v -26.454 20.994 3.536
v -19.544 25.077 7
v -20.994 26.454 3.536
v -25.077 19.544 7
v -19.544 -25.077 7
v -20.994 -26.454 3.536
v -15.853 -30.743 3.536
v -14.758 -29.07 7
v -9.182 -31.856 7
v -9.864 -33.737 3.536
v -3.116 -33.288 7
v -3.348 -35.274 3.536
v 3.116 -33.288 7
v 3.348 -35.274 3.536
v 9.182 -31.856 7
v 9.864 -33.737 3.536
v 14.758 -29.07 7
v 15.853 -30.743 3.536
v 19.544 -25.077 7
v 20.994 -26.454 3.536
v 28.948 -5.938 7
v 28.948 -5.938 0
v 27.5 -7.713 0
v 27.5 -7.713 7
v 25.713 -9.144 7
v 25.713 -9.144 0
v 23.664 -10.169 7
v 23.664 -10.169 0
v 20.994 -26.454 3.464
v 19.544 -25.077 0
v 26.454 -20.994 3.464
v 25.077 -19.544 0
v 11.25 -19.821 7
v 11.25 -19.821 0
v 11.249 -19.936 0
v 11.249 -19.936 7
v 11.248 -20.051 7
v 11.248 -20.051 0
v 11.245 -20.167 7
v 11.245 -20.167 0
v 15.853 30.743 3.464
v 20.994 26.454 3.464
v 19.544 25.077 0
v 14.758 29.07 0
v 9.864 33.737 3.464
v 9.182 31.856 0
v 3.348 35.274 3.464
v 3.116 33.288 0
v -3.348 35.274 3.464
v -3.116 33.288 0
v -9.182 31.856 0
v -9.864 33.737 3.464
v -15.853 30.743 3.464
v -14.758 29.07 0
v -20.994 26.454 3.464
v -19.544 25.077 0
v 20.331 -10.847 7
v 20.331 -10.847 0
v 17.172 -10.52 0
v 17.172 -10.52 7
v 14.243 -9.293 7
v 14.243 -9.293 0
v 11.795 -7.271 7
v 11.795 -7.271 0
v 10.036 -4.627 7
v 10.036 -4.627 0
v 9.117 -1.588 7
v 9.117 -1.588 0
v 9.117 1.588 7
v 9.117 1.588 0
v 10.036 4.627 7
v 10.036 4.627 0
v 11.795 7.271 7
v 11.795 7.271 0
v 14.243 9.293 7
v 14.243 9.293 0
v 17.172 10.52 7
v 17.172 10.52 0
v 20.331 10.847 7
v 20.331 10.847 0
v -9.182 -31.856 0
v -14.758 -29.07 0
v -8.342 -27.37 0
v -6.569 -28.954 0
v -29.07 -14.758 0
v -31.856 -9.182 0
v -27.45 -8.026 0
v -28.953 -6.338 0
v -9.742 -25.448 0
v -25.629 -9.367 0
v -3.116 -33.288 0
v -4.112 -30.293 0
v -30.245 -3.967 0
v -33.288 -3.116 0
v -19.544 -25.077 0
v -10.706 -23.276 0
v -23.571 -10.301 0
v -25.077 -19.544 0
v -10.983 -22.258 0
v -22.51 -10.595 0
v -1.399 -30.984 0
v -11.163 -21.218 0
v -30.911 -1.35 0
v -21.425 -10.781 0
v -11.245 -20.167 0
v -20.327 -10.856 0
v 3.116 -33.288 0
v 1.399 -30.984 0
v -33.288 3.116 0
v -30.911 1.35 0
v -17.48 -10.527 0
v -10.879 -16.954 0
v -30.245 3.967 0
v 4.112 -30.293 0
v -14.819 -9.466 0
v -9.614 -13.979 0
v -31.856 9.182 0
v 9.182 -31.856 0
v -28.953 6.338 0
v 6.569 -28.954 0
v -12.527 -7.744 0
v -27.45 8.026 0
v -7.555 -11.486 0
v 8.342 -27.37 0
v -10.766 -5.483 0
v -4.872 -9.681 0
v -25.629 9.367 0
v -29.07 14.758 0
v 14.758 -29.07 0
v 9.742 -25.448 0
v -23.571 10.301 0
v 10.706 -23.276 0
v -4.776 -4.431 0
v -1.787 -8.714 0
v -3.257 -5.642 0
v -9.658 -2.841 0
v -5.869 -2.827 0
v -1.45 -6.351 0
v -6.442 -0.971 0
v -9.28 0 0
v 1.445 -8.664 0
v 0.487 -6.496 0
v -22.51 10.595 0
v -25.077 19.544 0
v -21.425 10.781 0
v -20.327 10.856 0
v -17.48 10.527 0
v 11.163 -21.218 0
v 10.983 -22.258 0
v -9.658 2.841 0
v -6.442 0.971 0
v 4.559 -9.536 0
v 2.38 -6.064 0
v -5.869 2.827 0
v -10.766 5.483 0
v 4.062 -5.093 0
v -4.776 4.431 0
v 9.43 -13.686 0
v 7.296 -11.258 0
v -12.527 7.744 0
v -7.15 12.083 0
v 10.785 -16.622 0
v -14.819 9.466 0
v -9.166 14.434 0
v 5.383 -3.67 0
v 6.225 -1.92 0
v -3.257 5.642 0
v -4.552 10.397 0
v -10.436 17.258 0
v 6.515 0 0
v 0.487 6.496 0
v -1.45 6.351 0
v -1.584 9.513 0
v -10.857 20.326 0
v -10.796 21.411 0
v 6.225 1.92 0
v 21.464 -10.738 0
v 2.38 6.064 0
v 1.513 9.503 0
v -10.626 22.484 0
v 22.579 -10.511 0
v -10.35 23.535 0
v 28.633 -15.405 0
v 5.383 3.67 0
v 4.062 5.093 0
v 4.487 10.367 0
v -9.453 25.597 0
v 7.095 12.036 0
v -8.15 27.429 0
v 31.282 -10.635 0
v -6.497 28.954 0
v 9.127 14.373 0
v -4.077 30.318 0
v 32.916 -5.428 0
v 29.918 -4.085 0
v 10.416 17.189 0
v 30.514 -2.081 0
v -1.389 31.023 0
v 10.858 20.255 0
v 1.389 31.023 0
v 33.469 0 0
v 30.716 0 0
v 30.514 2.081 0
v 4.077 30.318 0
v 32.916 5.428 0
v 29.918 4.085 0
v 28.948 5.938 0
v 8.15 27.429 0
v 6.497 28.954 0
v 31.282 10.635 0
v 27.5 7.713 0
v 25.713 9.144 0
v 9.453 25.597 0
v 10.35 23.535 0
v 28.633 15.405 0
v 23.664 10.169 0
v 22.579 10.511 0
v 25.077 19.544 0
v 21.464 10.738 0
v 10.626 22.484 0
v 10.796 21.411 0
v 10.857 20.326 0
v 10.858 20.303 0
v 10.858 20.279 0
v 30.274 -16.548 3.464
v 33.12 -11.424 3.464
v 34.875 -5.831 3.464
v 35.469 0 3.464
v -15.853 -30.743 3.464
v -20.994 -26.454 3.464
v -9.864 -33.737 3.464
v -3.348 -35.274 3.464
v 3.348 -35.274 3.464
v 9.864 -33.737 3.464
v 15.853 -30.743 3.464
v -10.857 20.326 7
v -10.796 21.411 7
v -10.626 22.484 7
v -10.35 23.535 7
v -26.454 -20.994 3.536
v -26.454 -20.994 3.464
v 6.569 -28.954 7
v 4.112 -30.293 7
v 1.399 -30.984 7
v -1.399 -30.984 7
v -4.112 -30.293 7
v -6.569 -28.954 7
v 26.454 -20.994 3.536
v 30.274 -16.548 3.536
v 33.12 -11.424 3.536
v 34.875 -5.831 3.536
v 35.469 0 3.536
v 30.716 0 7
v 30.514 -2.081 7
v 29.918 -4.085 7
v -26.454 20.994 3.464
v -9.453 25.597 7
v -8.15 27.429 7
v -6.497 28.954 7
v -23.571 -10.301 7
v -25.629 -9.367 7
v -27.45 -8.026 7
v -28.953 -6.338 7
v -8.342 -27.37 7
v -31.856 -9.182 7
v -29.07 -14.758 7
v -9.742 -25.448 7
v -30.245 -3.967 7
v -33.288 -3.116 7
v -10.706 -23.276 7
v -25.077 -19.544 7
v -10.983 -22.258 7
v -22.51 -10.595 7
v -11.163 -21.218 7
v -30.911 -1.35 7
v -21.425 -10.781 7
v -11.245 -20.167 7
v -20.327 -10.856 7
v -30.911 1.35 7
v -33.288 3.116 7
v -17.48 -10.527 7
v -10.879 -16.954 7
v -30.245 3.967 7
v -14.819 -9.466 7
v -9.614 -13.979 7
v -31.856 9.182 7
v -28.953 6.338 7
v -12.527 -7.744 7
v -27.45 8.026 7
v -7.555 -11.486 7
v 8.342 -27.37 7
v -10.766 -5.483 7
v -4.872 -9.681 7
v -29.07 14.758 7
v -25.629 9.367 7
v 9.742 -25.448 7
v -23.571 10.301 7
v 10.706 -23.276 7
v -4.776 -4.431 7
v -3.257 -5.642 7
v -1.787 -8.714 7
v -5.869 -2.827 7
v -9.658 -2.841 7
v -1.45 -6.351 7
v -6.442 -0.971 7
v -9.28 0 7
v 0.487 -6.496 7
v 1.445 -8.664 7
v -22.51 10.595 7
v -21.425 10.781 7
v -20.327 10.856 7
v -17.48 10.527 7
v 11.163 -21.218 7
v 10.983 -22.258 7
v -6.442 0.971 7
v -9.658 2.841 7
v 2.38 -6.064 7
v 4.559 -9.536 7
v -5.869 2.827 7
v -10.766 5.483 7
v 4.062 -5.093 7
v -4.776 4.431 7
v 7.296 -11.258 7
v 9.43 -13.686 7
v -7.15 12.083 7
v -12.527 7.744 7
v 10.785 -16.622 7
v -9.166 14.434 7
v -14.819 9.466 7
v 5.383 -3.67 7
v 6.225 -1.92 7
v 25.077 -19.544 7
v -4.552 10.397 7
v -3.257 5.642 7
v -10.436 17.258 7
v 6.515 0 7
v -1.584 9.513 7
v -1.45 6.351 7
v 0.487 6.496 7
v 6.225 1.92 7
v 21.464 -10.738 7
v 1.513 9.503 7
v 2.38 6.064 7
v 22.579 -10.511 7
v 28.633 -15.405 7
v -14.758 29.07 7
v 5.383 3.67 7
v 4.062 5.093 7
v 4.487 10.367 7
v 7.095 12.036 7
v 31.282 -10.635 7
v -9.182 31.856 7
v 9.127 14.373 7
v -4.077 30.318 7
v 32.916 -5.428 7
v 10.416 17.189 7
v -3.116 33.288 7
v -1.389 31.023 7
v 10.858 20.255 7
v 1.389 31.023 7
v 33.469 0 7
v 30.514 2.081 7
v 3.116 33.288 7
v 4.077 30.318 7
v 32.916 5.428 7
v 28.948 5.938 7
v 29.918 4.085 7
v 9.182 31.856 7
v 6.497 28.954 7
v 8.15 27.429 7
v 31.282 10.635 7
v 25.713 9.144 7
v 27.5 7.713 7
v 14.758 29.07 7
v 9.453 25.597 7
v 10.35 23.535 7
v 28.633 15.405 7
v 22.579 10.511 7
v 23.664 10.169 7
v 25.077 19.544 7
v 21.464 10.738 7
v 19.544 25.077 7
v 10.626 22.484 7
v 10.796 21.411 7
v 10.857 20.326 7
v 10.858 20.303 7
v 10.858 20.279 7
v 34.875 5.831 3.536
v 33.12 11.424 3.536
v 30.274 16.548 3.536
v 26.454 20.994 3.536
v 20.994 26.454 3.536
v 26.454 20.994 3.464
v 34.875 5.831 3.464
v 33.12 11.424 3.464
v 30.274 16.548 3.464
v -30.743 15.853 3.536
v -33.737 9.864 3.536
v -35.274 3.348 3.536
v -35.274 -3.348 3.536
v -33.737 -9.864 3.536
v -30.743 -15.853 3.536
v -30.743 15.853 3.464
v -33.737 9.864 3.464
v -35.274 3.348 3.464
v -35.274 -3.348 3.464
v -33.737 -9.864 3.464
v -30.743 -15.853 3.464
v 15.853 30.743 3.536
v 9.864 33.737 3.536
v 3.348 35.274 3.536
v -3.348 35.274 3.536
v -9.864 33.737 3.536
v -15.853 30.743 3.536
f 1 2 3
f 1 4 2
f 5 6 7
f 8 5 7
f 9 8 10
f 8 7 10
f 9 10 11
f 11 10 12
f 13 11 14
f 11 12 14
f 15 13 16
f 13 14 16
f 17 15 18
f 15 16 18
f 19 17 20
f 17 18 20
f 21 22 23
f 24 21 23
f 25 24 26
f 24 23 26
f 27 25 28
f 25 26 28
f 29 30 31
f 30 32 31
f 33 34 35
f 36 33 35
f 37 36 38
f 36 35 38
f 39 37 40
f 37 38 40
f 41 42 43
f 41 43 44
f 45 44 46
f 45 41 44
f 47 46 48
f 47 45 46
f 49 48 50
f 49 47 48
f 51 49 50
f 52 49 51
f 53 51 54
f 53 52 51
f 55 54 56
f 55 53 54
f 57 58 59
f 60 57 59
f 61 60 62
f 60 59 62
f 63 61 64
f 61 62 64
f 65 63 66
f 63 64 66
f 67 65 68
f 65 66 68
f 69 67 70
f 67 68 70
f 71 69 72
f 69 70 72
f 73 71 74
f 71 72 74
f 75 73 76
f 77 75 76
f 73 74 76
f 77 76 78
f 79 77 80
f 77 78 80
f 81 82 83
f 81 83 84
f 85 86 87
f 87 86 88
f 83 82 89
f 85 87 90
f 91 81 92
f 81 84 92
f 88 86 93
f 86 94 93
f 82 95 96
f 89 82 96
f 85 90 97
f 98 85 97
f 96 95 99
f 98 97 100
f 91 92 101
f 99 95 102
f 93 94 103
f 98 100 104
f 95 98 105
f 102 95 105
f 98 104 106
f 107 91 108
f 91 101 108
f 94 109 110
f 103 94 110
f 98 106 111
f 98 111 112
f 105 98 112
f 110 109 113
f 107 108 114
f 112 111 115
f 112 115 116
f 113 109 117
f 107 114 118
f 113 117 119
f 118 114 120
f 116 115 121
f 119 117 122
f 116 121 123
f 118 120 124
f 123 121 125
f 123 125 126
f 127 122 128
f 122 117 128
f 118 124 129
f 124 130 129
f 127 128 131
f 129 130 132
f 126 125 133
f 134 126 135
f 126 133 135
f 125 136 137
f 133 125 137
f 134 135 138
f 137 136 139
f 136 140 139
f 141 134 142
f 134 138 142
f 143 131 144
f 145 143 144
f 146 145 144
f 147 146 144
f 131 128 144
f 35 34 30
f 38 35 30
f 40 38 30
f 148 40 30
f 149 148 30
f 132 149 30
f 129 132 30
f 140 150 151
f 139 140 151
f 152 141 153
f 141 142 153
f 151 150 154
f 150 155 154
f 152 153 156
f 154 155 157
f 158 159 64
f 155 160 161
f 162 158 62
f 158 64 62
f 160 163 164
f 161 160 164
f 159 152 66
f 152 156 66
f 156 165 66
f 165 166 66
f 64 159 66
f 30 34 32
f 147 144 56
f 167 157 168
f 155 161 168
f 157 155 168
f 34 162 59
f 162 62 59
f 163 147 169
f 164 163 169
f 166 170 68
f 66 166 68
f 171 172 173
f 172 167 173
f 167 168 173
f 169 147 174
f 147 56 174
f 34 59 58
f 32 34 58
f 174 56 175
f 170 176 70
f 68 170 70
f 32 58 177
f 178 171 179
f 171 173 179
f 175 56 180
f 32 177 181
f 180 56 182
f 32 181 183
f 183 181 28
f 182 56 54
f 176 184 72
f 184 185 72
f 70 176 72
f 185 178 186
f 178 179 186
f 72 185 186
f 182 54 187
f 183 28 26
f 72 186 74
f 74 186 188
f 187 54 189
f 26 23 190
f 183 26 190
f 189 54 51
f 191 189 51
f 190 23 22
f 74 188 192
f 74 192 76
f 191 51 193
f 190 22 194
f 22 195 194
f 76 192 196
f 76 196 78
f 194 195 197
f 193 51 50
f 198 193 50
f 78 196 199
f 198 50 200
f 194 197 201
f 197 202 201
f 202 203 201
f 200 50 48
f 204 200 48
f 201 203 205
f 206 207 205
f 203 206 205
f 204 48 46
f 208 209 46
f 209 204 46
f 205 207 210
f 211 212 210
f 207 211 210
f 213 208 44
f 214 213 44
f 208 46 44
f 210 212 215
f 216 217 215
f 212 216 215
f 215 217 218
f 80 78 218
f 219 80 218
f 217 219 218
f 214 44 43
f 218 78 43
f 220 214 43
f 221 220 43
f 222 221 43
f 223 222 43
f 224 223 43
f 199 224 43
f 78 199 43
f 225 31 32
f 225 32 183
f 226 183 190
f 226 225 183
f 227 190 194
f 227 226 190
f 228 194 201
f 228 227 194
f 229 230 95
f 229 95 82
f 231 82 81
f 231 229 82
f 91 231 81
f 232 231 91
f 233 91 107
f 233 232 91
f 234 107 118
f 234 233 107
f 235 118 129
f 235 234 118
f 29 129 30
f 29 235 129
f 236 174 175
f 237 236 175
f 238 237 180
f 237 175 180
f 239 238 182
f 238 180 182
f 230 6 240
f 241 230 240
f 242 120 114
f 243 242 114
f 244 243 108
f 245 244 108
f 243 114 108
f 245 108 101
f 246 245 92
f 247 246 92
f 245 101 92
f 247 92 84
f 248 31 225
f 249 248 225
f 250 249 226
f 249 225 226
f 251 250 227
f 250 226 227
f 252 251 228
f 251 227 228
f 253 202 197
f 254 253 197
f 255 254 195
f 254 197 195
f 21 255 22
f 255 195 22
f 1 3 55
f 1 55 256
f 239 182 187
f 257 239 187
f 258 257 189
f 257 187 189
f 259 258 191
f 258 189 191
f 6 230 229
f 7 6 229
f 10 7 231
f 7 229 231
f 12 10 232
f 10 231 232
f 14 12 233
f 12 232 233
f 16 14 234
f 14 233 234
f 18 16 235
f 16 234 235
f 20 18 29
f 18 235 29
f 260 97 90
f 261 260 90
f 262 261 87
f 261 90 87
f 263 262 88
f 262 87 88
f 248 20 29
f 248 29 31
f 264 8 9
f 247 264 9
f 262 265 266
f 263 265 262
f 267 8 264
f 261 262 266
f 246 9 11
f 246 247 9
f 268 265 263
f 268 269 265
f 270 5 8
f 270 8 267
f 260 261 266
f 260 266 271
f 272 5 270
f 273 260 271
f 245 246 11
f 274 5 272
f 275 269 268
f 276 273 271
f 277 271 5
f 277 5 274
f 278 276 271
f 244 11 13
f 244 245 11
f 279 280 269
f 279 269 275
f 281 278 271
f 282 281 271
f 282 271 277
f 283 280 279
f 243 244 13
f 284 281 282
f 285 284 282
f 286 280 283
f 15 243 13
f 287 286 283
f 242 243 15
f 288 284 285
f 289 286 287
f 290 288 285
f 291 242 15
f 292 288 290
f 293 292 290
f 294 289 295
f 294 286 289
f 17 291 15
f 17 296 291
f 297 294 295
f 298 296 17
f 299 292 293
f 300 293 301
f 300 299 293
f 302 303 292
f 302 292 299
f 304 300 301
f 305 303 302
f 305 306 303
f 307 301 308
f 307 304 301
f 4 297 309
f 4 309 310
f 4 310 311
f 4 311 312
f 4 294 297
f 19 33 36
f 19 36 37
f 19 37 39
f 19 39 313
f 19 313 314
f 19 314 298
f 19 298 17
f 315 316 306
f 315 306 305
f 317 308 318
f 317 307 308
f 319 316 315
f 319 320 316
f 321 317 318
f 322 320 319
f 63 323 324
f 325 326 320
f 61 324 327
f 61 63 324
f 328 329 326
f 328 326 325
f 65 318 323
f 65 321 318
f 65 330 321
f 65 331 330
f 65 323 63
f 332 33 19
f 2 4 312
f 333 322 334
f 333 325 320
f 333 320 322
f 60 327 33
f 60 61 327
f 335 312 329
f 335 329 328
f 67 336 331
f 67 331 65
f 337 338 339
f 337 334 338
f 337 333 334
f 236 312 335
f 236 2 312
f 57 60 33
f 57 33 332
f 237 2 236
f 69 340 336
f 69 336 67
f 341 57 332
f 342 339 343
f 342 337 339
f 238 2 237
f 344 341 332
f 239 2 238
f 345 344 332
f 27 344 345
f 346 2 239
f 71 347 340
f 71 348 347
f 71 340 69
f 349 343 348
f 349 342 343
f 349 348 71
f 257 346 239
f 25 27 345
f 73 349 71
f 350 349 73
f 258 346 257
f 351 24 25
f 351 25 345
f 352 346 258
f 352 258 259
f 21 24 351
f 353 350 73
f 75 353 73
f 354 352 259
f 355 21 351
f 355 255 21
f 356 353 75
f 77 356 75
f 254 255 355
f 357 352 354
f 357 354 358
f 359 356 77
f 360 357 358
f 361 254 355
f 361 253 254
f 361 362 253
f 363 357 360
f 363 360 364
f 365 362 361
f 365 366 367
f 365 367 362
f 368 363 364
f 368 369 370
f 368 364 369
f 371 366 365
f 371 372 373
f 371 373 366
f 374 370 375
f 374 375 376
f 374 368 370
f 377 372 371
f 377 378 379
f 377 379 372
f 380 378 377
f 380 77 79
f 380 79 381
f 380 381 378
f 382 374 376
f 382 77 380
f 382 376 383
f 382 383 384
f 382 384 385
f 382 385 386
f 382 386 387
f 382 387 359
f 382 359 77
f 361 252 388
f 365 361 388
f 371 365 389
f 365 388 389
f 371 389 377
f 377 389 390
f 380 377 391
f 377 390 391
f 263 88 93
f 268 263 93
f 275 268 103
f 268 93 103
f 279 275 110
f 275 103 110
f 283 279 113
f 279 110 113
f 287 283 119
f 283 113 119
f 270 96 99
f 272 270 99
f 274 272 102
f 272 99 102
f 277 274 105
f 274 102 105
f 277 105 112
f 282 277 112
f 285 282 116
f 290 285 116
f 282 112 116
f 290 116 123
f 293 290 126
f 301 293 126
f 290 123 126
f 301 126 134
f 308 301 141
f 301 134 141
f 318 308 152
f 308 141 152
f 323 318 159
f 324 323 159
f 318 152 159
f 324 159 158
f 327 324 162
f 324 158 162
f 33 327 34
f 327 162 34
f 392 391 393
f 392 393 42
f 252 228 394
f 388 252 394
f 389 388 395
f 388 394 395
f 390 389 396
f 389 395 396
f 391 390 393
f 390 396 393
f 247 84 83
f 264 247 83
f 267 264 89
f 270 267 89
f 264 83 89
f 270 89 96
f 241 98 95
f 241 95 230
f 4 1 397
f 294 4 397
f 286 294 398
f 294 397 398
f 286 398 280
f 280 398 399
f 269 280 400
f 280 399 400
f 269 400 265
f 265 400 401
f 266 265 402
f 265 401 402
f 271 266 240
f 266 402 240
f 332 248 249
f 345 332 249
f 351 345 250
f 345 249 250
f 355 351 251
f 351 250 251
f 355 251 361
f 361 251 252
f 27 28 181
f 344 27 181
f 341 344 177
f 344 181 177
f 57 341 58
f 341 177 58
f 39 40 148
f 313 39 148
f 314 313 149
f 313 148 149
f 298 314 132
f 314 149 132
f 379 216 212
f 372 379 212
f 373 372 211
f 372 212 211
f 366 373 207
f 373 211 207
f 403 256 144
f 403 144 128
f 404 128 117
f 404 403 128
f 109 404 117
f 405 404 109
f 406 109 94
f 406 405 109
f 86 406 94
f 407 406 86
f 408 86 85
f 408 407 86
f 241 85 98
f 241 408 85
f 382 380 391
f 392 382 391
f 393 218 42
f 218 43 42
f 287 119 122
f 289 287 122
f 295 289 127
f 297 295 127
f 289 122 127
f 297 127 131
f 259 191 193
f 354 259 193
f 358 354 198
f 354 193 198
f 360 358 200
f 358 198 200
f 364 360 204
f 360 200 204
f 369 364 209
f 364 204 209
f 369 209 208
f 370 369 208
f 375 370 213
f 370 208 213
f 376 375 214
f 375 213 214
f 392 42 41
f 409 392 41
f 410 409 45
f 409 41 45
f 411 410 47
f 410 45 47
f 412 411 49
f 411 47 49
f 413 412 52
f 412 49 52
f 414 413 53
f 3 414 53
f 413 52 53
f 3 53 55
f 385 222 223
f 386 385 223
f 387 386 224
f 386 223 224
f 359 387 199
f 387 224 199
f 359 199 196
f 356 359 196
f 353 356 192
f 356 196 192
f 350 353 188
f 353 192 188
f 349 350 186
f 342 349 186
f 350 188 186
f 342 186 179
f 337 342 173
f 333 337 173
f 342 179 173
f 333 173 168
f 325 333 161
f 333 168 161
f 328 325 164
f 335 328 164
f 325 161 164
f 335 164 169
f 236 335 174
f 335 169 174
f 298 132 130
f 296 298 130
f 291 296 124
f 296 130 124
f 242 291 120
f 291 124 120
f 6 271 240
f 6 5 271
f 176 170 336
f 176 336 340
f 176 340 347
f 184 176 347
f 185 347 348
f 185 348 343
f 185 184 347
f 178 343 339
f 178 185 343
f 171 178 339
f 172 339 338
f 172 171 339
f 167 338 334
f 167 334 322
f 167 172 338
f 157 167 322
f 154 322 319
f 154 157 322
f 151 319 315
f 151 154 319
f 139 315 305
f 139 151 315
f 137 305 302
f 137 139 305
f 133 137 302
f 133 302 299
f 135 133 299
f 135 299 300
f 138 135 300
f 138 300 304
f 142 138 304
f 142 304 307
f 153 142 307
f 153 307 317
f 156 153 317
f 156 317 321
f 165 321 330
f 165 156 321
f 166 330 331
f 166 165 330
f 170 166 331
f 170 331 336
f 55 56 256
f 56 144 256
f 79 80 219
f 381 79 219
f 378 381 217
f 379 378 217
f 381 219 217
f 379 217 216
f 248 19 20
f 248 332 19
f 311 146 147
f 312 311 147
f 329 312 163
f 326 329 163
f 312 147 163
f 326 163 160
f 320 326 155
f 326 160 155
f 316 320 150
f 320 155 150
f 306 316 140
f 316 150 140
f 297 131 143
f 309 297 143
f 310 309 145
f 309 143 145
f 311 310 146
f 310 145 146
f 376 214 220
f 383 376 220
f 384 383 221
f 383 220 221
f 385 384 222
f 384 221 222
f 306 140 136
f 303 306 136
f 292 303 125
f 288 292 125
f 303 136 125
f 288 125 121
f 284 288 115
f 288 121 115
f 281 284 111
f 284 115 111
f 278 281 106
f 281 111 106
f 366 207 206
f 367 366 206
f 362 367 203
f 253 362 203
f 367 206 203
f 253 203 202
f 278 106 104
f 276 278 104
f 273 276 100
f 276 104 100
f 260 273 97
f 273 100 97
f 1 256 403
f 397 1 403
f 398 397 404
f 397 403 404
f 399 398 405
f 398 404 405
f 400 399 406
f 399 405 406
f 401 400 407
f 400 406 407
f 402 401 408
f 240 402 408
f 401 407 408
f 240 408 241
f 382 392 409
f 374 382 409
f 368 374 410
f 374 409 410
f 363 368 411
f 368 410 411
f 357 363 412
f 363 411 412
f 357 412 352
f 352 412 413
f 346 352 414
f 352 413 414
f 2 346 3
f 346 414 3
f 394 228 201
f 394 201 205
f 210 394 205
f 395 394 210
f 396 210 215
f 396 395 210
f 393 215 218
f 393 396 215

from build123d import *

# Parameters (mm, degrees)
F0_R       = 6.5146341495
F1_DEPTH   = 7
F2_R       = 150
F3_SIZE2   = 3.4641016151
F3_SIZE    = 2
F3_2_SIZE2 = 3.4641016151
F3_2_SIZE  = 2


with BuildPart() as f1:
    # F0 (on Top) → F1 (new body)
    with BuildSketch(Plane.XY):
        with BuildLine():
            ThreePointArc((20.3305371016, 10.8474336629), (18.8276716907, 14.0034842548), (16.9554240496, 16.9554240496))
            ThreePointArc((16.9554240496, 16.9554240496), (14.0082290327, 18.8250492727), (10.8574857337, 20.3264731323))
            ThreePointArc((10.8574857337, 20.3264731323), (10.8576641201, 20.2905395913), (10.8577235824, 20.2546056568))
            ThreePointArc((10.8577235824, 20.2546056568), (-0.0359339345, 9.3969415367), (-10.8574857337, 20.3264731323))
            ThreePointArc((-10.8574857337, 20.3264731323), (-14.0082290327, 18.8250492727), (-16.9554240496, 16.9554240496))
            ThreePointArc((-16.9554240496, 16.9554240496), (-18.8254179031, 14.0075621913), (-20.3270445442, 10.8560730228))
            ThreePointArc((-20.3270445442, 10.8560730228), (-12.5273872935, 7.7442134548), (-9.280006631, 0))
            ThreePointArc((-9.280006631, 0), (-12.5273872935, -7.7442134548), (-20.3270445442, -10.8560730228))
            ThreePointArc((-20.3270445442, -10.8560730228), (-18.8254179031, -14.0075621913), (-16.9554240496, -16.9554240496))
            ThreePointArc((-16.9554240496, -16.9554240496), (-14.1911797406, -18.7230451047), (-11.2446974396, -20.1665730208))
            ThreePointArc((-11.2446974396, -20.1665730208), (-0.1727046676, -8.5725301074), (11.25, -19.8212043892))
            ThreePointArc((11.25, -19.8212043892), (11.2486742818, -19.9939090568), (11.2446974396, -20.1665730208))
            ThreePointArc((11.2446974396, -20.1665730208), (14.1911797406, -18.7230451047), (16.9554240496, -16.9554240496))
            ThreePointArc((16.9554240496, -16.9554240496), (18.8276716907, -14.0034842548), (20.3305371016, -10.8474336629))
            ThreePointArc((20.3305371016, -10.8474336629), (9.0002203311, 0), (20.3305371016, 10.8474336629))
        make_face()
        Circle(F0_R, mode=Mode.SUBTRACT)
        with BuildLine():
            ThreePointArc((-16.9554240496, 16.9554240496), (-20.5343741855, 13.8978501036), (-23.5705866136, 10.300760085))
            ThreePointArc((-23.5705866136, 10.300760085), (-21.9699756434, 10.7020109361), (-20.3270445442, 10.8560730228))
            ThreePointArc((-20.3270445442, 10.8560730228), (-18.8254179031, 14.0075621913), (-16.9554240496, 16.9554240496))
        make_face()
        with BuildLine():
            ThreePointArc((-6.4970776314, 28.9539242303), (-15.4163775625, 27.5515698423), (-23.470058199, 23.470058199))
            ThreePointArc((-23.470058199, 23.470058199), (-27.5758715938, 15.3408078623), (-28.9533926969, 6.3383165249))
            ThreePointArc((-28.9533926969, 6.3383165249), (-26.5744835451, 8.7440475719), (-23.5705866136, 10.300760085))
            ThreePointArc((-23.5705866136, 10.300760085), (-20.5343741855, 13.8978501036), (-16.9554240496, 16.9554240496))
            ThreePointArc((-16.9554240496, 16.9554240496), (-13.9194172815, 20.5129124867), (-10.3502609953, 23.5351938238))
            ThreePointArc((-10.3502609953, 23.5351938238), (-8.8486645605, 26.5467672001), (-6.4970776314, 28.9539242303))
        make_face()
        with BuildLine():
            ThreePointArc((-10.8574857337, 20.3264731323), (-10.7245560491, 21.9499106272), (-10.3502609953, 23.5351938238))
            ThreePointArc((-10.3502609953, 23.5351938238), (-13.9194172815, 20.5129124867), (-16.9554240496, 16.9554240496))
            ThreePointArc((-16.9554240496, 16.9554240496), (-14.0082290327, 18.8250492727), (-10.8574857337, 20.3264731323))
        make_face()
        with BuildLine():
            ThreePointArc((-28.9533926969, -6.3383165249), (-27.5758715938, -15.3408078623), (-23.470058199, -23.470058199))
            ThreePointArc((-23.470058199, -23.470058199), (-15.4507716917, -27.5404335913), (-6.5693817436, -28.9538777933))
            ThreePointArc((-6.5693817436, -28.9538777933), (-9.0925043483, -26.4460715332), (-10.7064490846, -23.2758314312))
            ThreePointArc((-10.7064490846, -23.2758314312), (-14.0749053099, -20.3568391805), (-16.9554240496, -16.9554240496))
            ThreePointArc((-16.9554240496, -16.9554240496), (-20.5343741855, -13.8978501036), (-23.5705866136, -10.300760085))
            ThreePointArc((-23.5705866136, -10.300760085), (-26.5744835451, -8.7440475719), (-28.9533926969, -6.3383165249))
        make_face()
        with BuildLine():
            ThreePointArc((-6.5693817436, -28.9538777933), (-15.4507716917, -27.5404335913), (-23.470058199, -23.470058199))
            ThreePointArc((-23.470058199, -23.470058199), (0, -35.4685637026), (23.470058199, -23.470058199))
            ThreePointArc((23.470058199, -23.470058199), (15.4507716917, -27.5404335913), (6.5693817436, -28.9538777933))
            ThreePointArc((6.5693817436, -28.9538777933), (0, -31.0712043892), (-6.5693817436, -28.9538777933))
        make_face()
        with BuildLine():
            ThreePointArc((-28.9533926969, 6.3383165249), (-27.5758715938, 15.3408078623), (-23.470058199, 23.470058199))
            ThreePointArc((-23.470058199, 23.470058199), (-35.4685637026, 0), (-23.470058199, -23.470058199))
            ThreePointArc((-23.470058199, -23.470058199), (-27.5758715938, -15.3408078623), (-28.9533926969, -6.3383165249))
            ThreePointArc((-28.9533926969, -6.3383165249), (-30.9954537959, 0), (-28.9533926969, 6.3383165249))
        make_face()
        with BuildLine():
            ThreePointArc((6.4970776314, 28.9539242303), (15.4163775625, 27.5515698423), (23.470058199, 23.470058199))
            ThreePointArc((23.470058199, 23.470058199), (0, 35.4685637026), (-23.470058199, 23.470058199))
            ThreePointArc((-23.470058199, 23.470058199), (-15.4163775625, 27.5515698423), (-6.4970776314, 28.9539242303))
            ThreePointArc((-6.4970776314, 28.9539242303), (0, 31.1123292392), (6.4970776314, 28.9539242303))
        make_face()
        with BuildLine():
            ThreePointArc((28.9481833992, 5.9378200954), (28.952492979, 6.2262128121), (28.9539295531, 6.5146341495))
            ThreePointArc((28.9539295531, 6.5146341495), (27.5488697433, 15.424730245), (23.470058199, 23.470058199))
            ThreePointArc((23.470058199, 23.470058199), (15.4163775625, 27.5515698423), (6.4970776314, 28.9539242303))
            ThreePointArc((6.4970776314, 28.9539242303), (8.8486645605, 26.5467672001), (10.3502609953, 23.5351938238))
            ThreePointArc((10.3502609953, 23.5351938238), (13.9194172815, 20.5129124867), (16.9554240496, 16.9554240496))
            ThreePointArc((16.9554240496, 16.9554240496), (20.591369411, 13.8403539947), (23.6642529801, 10.1686858877))
            ThreePointArc((23.6642529801, 10.1686858877), (26.6443492565, 8.4755450511), (28.9481833992, 5.9378200954))
        make_face()
        with BuildLine():
            ThreePointArc((16.9554240496, 16.9554240496), (13.9194172815, 20.5129124867), (10.3502609953, 23.5351938238))
            ThreePointArc((10.3502609953, 23.5351938238), (10.7245560491, 21.9499106272), (10.8574857337, 20.3264731323))
            ThreePointArc((10.8574857337, 20.3264731323), (14.0082290327, 18.8250492727), (16.9554240496, 16.9554240496))
        make_face()
        with BuildLine():
            ThreePointArc((20.3305371016, 10.8474336629), (22.0241446803, 10.6394424492), (23.6642529801, 10.1686858877))
            ThreePointArc((23.6642529801, 10.1686858877), (20.591369411, 13.8403539947), (16.9554240496, 16.9554240496))
            ThreePointArc((16.9554240496, 16.9554240496), (18.8276716907, 14.0034842548), (20.3305371016, 10.8474336629))
        make_face()
        with BuildLine():
            ThreePointArc((23.470058199, 23.470058199), (27.5488697433, 15.424730245), (28.9539295531, 6.5146341495))
            ThreePointArc((28.9539295531, 6.5146341495), (28.952492979, 6.2262128121), (28.9481833992, 5.9378200954))
            ThreePointArc((28.9481833992, 5.9378200954), (30.2644195183, 3.0976486049), (30.7156674959, 0))
            ThreePointArc((30.7156674959, 0), (30.2644195183, -3.0976486049), (28.9481833992, -5.9378200954))
            ThreePointArc((28.9481833992, -5.9378200954), (28.952492979, -6.2262128121), (28.9539295531, -6.5146341495))
            ThreePointArc((28.9539295531, -6.5146341495), (27.5488697433, -15.424730245), (23.470058199, -23.470058199))
            ThreePointArc((23.470058199, -23.470058199), (32.2950161292, -13.1796032393), (35.4685637026, 0))
            ThreePointArc((35.4685637026, 0), (32.2950161292, 13.1796032393), (23.470058199, 23.470058199))
        make_face()
        with BuildLine():
            ThreePointArc((16.9554240496, -16.9554240496), (20.591369411, -13.8403539947), (23.6642529801, -10.1686858877))
            ThreePointArc((23.6642529801, -10.1686858877), (22.0241446803, -10.6394424492), (20.3305371016, -10.8474336629))
            ThreePointArc((20.3305371016, -10.8474336629), (18.8276716907, -14.0034842548), (16.9554240496, -16.9554240496))
        make_face()
        with BuildLine():
            ThreePointArc((-16.9554240496, -16.9554240496), (-14.0749053099, -20.3568391805), (-10.7064490846, -23.2758314312))
            ThreePointArc((-10.7064490846, -23.2758314312), (-11.0851287948, -21.7401675475), (-11.2446974396, -20.1665730208))
            ThreePointArc((-11.2446974396, -20.1665730208), (-14.1911797406, -18.7230451047), (-16.9554240496, -16.9554240496))
        make_face()
        with BuildLine():
            ThreePointArc((-20.3270445442, -10.8560730228), (-21.9699756434, -10.7020109361), (-23.5705866136, -10.300760085))
            ThreePointArc((-23.5705866136, -10.300760085), (-20.5343741855, -13.8978501036), (-16.9554240496, -16.9554240496))
            ThreePointArc((-16.9554240496, -16.9554240496), (-18.8254179031, -14.0075621913), (-20.3270445442, -10.8560730228))
        make_face()
        with BuildLine():
            ThreePointArc((6.5693817436, -28.9538777933), (15.4507716917, -27.5404335913), (23.470058199, -23.470058199))
            ThreePointArc((23.470058199, -23.470058199), (27.5488697433, -15.424730245), (28.9539295531, -6.5146341495))
            ThreePointArc((28.9539295531, -6.5146341495), (28.952492979, -6.2262128121), (28.9481833992, -5.9378200954))
            ThreePointArc((28.9481833992, -5.9378200954), (26.6443492565, -8.4755450511), (23.6642529801, -10.1686858877))
            ThreePointArc((23.6642529801, -10.1686858877), (20.591369411, -13.8403539947), (16.9554240496, -16.9554240496))
            ThreePointArc((16.9554240496, -16.9554240496), (14.0749053099, -20.3568391805), (10.7064490846, -23.2758314312))
            ThreePointArc((10.7064490846, -23.2758314312), (9.0925043483, -26.4460715332), (6.5693817436, -28.9538777933))
        make_face()
        with BuildLine():
            ThreePointArc((10.7064490846, -23.2758314312), (14.0749053099, -20.3568391805), (16.9554240496, -16.9554240496))
            ThreePointArc((16.9554240496, -16.9554240496), (14.1911797406, -18.7230451047), (11.2446974396, -20.1665730208))
            ThreePointArc((11.2446974396, -20.1665730208), (11.0851287948, -21.7401675475), (10.7064490846, -23.2758314312))
        make_face()
    extrude(amount=F1_DEPTH)

    # F2
    f2_edges = [f1.edges().sort_by_distance(p)[0] for p in [
        (23.470058, -23.470058, 3.5),
        (23.470058, 23.470058, 3.5),
        (-23.470058, 23.470058, 3.5),
        (-23.470058, -23.470058, 3.5),
    ]]
    fillet(f2_edges, radius=F2_R)

    # F3
    f3_edges = [f1.edges().sort_by_distance(p)[0] for p in [
        (-35.468564, 0, 7),
    ]]
    f3_side = f1.faces().sort_by_distance((0, -34.465361, 7))[0]
    chamfer(f3_edges, length=F3_SIZE, length2=F3_SIZE2, reference=f3_side)

    # F3#2
    f3_2_edges = [f1.edges().sort_by_distance(p)[0] for p in [
        (-35.468564, 0, 0),
    ]]
    f3_2_side = f1.faces().sort_by_distance((0, -34.465361, 0))[0]
    chamfer(f3_2_edges, length=F3_2_SIZE, length2=F3_2_SIZE2, reference=f3_2_side)


solid = f1.part
